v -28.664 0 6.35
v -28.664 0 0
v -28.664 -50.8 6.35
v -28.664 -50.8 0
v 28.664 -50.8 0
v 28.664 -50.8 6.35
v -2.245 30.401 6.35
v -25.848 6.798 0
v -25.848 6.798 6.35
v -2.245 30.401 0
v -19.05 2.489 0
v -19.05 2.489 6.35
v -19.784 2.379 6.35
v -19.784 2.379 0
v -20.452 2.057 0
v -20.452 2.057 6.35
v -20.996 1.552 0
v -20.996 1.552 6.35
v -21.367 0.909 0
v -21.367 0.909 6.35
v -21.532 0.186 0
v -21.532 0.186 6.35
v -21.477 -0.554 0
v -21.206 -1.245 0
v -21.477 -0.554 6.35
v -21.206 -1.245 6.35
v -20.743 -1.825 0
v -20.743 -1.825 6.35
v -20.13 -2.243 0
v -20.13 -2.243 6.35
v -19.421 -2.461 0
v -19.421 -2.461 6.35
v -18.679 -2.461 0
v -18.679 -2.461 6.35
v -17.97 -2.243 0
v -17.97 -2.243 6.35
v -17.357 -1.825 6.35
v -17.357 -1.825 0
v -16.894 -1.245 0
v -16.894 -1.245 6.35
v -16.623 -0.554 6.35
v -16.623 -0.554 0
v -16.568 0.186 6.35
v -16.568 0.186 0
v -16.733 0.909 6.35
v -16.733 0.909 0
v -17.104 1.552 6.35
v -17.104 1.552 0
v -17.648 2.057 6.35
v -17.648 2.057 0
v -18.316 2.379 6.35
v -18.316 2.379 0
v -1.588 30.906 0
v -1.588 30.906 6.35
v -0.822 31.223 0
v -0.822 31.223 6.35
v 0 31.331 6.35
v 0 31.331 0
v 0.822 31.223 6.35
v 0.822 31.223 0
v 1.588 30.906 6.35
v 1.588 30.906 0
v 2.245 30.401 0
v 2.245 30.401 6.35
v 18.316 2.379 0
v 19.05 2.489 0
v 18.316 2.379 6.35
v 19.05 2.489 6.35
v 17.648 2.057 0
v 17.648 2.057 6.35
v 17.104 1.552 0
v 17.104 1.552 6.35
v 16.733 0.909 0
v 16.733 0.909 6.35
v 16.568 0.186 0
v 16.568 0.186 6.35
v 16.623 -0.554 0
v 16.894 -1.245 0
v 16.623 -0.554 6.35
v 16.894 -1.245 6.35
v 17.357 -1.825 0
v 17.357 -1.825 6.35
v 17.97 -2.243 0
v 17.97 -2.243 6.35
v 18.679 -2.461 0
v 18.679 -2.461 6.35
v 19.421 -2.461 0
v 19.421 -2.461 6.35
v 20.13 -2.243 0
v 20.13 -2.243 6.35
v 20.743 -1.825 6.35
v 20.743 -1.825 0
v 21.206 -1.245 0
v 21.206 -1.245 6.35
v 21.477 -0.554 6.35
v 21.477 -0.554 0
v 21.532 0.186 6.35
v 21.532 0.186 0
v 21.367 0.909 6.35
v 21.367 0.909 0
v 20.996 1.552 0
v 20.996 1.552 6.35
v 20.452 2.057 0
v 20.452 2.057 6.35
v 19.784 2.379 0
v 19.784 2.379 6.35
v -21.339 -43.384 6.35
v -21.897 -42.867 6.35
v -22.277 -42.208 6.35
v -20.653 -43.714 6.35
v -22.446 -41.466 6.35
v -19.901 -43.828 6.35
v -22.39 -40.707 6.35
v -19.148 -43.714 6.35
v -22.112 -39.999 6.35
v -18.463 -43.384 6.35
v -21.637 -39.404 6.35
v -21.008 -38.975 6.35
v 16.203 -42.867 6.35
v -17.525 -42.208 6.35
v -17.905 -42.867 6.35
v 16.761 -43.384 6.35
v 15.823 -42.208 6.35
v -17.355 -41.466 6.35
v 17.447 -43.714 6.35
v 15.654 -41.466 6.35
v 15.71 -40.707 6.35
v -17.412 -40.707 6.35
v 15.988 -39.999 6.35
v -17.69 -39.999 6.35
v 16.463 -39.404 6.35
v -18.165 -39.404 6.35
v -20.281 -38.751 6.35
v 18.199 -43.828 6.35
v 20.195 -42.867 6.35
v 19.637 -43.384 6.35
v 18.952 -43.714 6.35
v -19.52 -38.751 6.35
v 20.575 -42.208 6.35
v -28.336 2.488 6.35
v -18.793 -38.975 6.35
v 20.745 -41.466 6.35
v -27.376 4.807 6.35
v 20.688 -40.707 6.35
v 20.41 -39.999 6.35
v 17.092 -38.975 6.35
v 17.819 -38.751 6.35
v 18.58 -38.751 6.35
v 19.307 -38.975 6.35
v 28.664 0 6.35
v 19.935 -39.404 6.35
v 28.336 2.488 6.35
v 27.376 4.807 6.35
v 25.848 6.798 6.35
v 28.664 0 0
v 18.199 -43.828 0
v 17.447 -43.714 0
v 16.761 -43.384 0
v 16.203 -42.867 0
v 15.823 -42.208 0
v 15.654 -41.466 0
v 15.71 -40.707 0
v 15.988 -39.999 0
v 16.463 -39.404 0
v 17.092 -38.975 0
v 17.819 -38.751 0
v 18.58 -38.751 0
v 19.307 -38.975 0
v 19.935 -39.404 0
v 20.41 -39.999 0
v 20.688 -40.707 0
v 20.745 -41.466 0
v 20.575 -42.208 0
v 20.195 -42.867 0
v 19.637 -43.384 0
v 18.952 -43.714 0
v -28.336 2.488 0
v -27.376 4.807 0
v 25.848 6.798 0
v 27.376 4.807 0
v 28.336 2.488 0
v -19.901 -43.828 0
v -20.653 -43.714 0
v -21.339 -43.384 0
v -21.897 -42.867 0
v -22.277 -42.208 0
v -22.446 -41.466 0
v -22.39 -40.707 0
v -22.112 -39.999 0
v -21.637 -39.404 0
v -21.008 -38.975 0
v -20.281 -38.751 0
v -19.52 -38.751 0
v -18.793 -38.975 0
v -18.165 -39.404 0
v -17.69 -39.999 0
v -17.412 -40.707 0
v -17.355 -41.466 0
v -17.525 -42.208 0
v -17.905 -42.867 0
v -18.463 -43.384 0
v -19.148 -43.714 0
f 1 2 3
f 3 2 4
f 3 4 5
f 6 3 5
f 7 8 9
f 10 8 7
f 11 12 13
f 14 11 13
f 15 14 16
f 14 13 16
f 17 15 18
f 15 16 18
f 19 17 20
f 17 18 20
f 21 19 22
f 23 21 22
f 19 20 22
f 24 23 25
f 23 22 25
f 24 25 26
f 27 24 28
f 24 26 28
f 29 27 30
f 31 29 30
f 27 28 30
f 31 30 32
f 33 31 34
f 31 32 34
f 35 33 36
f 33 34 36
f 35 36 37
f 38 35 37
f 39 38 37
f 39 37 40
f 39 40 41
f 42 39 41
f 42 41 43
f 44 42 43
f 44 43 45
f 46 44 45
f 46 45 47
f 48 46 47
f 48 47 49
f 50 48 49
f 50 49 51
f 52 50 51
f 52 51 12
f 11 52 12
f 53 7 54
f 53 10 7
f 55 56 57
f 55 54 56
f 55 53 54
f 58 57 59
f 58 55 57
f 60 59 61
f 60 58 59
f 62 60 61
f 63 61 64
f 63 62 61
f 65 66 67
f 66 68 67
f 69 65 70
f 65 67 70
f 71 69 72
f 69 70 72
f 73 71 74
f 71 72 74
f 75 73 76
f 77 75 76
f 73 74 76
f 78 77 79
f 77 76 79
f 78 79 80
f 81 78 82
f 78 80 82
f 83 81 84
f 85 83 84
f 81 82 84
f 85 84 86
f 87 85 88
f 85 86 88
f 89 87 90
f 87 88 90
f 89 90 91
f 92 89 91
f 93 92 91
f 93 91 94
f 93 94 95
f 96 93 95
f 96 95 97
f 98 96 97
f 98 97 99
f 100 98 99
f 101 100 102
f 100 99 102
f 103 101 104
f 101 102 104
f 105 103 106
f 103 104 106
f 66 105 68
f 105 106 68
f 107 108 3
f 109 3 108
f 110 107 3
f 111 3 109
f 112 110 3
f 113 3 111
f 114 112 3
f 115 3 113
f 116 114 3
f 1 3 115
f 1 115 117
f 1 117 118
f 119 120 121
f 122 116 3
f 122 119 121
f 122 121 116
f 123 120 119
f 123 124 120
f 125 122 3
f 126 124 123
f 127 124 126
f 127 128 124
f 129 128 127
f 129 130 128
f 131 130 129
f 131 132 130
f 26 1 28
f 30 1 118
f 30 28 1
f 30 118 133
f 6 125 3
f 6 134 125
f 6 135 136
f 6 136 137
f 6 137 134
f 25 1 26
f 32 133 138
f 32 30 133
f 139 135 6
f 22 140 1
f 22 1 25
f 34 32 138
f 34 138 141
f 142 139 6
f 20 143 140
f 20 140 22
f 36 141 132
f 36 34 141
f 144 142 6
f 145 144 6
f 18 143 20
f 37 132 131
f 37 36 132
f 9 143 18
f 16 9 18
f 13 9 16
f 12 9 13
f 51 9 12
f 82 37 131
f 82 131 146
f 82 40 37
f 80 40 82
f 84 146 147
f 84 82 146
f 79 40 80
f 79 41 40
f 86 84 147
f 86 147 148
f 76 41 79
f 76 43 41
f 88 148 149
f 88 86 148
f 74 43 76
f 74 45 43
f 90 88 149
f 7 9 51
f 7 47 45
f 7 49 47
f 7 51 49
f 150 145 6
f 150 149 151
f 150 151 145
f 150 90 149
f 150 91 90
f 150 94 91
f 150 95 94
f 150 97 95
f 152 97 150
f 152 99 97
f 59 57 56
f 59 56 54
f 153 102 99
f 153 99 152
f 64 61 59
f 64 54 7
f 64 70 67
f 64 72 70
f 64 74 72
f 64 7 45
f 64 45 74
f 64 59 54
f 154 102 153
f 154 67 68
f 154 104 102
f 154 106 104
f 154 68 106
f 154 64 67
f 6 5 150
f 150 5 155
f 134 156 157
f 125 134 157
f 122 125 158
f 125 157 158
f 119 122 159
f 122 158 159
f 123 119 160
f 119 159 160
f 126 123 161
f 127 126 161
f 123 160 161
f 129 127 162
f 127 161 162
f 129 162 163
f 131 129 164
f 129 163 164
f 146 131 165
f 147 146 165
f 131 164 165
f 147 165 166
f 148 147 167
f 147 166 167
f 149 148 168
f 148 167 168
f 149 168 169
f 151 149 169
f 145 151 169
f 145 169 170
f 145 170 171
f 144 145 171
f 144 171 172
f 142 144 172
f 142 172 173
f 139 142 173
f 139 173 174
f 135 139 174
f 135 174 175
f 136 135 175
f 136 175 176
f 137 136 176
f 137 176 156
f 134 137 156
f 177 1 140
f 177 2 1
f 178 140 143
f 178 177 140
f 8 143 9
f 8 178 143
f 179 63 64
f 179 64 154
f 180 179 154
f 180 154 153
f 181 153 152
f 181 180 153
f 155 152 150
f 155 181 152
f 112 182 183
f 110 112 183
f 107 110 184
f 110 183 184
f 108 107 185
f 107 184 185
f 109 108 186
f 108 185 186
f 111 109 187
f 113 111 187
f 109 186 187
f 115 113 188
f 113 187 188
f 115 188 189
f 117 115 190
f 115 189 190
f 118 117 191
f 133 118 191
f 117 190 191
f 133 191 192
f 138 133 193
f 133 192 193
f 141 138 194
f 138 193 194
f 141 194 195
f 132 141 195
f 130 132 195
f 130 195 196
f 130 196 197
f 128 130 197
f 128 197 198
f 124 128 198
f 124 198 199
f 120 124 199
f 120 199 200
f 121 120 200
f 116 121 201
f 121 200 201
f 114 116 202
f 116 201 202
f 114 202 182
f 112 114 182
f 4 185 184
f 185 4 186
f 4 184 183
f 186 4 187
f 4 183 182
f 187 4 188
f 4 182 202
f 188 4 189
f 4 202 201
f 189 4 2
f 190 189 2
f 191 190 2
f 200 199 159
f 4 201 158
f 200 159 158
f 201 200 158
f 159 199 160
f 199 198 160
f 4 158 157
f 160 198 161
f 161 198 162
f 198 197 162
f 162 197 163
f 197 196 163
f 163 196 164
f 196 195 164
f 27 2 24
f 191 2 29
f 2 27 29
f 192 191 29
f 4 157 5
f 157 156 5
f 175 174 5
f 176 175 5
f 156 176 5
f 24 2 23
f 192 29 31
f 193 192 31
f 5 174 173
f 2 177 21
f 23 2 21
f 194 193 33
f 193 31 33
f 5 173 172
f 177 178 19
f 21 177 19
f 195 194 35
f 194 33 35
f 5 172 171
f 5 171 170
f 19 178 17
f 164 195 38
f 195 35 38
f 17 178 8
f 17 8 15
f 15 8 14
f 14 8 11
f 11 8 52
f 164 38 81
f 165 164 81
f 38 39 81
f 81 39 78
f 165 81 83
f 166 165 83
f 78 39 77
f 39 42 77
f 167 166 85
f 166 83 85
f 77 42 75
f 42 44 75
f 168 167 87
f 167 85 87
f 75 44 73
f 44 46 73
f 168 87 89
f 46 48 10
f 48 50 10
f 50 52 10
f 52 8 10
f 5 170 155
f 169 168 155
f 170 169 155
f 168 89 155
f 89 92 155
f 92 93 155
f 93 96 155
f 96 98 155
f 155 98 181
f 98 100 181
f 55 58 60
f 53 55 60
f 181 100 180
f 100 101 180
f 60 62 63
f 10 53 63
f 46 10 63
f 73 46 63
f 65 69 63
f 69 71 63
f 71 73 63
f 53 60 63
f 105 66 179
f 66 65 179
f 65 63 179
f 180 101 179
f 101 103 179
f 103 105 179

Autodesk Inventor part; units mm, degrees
ref_plane "YZ Plane" through (0, 0, 0) normal (1, 0, 0) x (0, 1, 0)
ref_plane "XZ Plane" through (0, 0, 0) normal (0, 1, 0) x (-1, 0, 0)
ref_plane "XY Plane" through (0, 0, 0) normal (0, 0, 1) x (1, 0, 0)
sketch "Sketch1" plane through (0, 0, 0) normal (0, 0, 1) x (1, 0, 0)
  line L0 (-19.05, 0) -> (19.05, 0) construction
  circle A0 centre (-19.05, 0) radius 3.2639
  circle A1 centre (19.05, 0) radius 3.2639
  arc A2 (-25.8481, 6.7981) -> (-28.6639, 0) centre (-19.05, 0) ccw
  arc A3 (28.6639, 0) -> (25.8481, 6.7981) centre (19.05, 0) ccw
  line L1 (-28.6639, 0) -> (-28.6639, -50.8)
  line L2 (-28.6639, -50.8) -> (28.6639, -50.8)
  line L3 (28.6639, -50.8) -> (28.6639, 0)
  line L4 (-25.8481, 6.7981) -> (-2.2451, 30.401)
  line L5 (2.2451, 30.401) -> (25.8481, 6.7981)
  arc A4 (2.2451, 30.401) -> (-2.2451, 30.401) centre (0, 28.156) ccw
  point P0 (0, 0)
  point P1 (0, 0)
  dimension "d0" = 6.5278
  dimension "d1" = 38.1
  dimension "d2" = 6.35
  dimension "d3" = 6.35
  dimension "d4" = 50.8
  dimension "d5" = 3.175
extrude "Extrusion1" add sketch "Sketch1" along normal blind 6.35 contours A0 | A1 | L4 A4 L5 A3 L3 L2 L1 A2
sketch "Sketch2" plane through (0, 0, 6.35) normal (0, 0, 1) x (1, 0, 0)
  line L0 (-19.9009, -41.275) -> (18.1991, -41.275) construction
  line L1 (-28.6639, -50.8) -> (28.6639, -50.8) projected
  point P0 (0, 0)
  dimension "d8" = 38.1
  dimension "d9" = 9.525
hole "Hole1" at (-19.9009, -41.275, 6.35) at (18.1991, -41.275, 6.35) direction (0, 0, -1) diameter 5.1054 end through all clearance for "Flat Head Machine Screw (82)" size "#10" standard "Ansi Unified Screw Threads"
hole "Hole2" at (-19.05, 0, 0) at (19.05, 0, 0) direction (0, 0, 1) diameter 4.9784 end through all thread size "1/4-20 UNC" class "2B" standard "ANSI Unified Screw Threads"
equation "\"d3\" = d2"
properties part number "CL7-005a" material "Aluminum 6061"
